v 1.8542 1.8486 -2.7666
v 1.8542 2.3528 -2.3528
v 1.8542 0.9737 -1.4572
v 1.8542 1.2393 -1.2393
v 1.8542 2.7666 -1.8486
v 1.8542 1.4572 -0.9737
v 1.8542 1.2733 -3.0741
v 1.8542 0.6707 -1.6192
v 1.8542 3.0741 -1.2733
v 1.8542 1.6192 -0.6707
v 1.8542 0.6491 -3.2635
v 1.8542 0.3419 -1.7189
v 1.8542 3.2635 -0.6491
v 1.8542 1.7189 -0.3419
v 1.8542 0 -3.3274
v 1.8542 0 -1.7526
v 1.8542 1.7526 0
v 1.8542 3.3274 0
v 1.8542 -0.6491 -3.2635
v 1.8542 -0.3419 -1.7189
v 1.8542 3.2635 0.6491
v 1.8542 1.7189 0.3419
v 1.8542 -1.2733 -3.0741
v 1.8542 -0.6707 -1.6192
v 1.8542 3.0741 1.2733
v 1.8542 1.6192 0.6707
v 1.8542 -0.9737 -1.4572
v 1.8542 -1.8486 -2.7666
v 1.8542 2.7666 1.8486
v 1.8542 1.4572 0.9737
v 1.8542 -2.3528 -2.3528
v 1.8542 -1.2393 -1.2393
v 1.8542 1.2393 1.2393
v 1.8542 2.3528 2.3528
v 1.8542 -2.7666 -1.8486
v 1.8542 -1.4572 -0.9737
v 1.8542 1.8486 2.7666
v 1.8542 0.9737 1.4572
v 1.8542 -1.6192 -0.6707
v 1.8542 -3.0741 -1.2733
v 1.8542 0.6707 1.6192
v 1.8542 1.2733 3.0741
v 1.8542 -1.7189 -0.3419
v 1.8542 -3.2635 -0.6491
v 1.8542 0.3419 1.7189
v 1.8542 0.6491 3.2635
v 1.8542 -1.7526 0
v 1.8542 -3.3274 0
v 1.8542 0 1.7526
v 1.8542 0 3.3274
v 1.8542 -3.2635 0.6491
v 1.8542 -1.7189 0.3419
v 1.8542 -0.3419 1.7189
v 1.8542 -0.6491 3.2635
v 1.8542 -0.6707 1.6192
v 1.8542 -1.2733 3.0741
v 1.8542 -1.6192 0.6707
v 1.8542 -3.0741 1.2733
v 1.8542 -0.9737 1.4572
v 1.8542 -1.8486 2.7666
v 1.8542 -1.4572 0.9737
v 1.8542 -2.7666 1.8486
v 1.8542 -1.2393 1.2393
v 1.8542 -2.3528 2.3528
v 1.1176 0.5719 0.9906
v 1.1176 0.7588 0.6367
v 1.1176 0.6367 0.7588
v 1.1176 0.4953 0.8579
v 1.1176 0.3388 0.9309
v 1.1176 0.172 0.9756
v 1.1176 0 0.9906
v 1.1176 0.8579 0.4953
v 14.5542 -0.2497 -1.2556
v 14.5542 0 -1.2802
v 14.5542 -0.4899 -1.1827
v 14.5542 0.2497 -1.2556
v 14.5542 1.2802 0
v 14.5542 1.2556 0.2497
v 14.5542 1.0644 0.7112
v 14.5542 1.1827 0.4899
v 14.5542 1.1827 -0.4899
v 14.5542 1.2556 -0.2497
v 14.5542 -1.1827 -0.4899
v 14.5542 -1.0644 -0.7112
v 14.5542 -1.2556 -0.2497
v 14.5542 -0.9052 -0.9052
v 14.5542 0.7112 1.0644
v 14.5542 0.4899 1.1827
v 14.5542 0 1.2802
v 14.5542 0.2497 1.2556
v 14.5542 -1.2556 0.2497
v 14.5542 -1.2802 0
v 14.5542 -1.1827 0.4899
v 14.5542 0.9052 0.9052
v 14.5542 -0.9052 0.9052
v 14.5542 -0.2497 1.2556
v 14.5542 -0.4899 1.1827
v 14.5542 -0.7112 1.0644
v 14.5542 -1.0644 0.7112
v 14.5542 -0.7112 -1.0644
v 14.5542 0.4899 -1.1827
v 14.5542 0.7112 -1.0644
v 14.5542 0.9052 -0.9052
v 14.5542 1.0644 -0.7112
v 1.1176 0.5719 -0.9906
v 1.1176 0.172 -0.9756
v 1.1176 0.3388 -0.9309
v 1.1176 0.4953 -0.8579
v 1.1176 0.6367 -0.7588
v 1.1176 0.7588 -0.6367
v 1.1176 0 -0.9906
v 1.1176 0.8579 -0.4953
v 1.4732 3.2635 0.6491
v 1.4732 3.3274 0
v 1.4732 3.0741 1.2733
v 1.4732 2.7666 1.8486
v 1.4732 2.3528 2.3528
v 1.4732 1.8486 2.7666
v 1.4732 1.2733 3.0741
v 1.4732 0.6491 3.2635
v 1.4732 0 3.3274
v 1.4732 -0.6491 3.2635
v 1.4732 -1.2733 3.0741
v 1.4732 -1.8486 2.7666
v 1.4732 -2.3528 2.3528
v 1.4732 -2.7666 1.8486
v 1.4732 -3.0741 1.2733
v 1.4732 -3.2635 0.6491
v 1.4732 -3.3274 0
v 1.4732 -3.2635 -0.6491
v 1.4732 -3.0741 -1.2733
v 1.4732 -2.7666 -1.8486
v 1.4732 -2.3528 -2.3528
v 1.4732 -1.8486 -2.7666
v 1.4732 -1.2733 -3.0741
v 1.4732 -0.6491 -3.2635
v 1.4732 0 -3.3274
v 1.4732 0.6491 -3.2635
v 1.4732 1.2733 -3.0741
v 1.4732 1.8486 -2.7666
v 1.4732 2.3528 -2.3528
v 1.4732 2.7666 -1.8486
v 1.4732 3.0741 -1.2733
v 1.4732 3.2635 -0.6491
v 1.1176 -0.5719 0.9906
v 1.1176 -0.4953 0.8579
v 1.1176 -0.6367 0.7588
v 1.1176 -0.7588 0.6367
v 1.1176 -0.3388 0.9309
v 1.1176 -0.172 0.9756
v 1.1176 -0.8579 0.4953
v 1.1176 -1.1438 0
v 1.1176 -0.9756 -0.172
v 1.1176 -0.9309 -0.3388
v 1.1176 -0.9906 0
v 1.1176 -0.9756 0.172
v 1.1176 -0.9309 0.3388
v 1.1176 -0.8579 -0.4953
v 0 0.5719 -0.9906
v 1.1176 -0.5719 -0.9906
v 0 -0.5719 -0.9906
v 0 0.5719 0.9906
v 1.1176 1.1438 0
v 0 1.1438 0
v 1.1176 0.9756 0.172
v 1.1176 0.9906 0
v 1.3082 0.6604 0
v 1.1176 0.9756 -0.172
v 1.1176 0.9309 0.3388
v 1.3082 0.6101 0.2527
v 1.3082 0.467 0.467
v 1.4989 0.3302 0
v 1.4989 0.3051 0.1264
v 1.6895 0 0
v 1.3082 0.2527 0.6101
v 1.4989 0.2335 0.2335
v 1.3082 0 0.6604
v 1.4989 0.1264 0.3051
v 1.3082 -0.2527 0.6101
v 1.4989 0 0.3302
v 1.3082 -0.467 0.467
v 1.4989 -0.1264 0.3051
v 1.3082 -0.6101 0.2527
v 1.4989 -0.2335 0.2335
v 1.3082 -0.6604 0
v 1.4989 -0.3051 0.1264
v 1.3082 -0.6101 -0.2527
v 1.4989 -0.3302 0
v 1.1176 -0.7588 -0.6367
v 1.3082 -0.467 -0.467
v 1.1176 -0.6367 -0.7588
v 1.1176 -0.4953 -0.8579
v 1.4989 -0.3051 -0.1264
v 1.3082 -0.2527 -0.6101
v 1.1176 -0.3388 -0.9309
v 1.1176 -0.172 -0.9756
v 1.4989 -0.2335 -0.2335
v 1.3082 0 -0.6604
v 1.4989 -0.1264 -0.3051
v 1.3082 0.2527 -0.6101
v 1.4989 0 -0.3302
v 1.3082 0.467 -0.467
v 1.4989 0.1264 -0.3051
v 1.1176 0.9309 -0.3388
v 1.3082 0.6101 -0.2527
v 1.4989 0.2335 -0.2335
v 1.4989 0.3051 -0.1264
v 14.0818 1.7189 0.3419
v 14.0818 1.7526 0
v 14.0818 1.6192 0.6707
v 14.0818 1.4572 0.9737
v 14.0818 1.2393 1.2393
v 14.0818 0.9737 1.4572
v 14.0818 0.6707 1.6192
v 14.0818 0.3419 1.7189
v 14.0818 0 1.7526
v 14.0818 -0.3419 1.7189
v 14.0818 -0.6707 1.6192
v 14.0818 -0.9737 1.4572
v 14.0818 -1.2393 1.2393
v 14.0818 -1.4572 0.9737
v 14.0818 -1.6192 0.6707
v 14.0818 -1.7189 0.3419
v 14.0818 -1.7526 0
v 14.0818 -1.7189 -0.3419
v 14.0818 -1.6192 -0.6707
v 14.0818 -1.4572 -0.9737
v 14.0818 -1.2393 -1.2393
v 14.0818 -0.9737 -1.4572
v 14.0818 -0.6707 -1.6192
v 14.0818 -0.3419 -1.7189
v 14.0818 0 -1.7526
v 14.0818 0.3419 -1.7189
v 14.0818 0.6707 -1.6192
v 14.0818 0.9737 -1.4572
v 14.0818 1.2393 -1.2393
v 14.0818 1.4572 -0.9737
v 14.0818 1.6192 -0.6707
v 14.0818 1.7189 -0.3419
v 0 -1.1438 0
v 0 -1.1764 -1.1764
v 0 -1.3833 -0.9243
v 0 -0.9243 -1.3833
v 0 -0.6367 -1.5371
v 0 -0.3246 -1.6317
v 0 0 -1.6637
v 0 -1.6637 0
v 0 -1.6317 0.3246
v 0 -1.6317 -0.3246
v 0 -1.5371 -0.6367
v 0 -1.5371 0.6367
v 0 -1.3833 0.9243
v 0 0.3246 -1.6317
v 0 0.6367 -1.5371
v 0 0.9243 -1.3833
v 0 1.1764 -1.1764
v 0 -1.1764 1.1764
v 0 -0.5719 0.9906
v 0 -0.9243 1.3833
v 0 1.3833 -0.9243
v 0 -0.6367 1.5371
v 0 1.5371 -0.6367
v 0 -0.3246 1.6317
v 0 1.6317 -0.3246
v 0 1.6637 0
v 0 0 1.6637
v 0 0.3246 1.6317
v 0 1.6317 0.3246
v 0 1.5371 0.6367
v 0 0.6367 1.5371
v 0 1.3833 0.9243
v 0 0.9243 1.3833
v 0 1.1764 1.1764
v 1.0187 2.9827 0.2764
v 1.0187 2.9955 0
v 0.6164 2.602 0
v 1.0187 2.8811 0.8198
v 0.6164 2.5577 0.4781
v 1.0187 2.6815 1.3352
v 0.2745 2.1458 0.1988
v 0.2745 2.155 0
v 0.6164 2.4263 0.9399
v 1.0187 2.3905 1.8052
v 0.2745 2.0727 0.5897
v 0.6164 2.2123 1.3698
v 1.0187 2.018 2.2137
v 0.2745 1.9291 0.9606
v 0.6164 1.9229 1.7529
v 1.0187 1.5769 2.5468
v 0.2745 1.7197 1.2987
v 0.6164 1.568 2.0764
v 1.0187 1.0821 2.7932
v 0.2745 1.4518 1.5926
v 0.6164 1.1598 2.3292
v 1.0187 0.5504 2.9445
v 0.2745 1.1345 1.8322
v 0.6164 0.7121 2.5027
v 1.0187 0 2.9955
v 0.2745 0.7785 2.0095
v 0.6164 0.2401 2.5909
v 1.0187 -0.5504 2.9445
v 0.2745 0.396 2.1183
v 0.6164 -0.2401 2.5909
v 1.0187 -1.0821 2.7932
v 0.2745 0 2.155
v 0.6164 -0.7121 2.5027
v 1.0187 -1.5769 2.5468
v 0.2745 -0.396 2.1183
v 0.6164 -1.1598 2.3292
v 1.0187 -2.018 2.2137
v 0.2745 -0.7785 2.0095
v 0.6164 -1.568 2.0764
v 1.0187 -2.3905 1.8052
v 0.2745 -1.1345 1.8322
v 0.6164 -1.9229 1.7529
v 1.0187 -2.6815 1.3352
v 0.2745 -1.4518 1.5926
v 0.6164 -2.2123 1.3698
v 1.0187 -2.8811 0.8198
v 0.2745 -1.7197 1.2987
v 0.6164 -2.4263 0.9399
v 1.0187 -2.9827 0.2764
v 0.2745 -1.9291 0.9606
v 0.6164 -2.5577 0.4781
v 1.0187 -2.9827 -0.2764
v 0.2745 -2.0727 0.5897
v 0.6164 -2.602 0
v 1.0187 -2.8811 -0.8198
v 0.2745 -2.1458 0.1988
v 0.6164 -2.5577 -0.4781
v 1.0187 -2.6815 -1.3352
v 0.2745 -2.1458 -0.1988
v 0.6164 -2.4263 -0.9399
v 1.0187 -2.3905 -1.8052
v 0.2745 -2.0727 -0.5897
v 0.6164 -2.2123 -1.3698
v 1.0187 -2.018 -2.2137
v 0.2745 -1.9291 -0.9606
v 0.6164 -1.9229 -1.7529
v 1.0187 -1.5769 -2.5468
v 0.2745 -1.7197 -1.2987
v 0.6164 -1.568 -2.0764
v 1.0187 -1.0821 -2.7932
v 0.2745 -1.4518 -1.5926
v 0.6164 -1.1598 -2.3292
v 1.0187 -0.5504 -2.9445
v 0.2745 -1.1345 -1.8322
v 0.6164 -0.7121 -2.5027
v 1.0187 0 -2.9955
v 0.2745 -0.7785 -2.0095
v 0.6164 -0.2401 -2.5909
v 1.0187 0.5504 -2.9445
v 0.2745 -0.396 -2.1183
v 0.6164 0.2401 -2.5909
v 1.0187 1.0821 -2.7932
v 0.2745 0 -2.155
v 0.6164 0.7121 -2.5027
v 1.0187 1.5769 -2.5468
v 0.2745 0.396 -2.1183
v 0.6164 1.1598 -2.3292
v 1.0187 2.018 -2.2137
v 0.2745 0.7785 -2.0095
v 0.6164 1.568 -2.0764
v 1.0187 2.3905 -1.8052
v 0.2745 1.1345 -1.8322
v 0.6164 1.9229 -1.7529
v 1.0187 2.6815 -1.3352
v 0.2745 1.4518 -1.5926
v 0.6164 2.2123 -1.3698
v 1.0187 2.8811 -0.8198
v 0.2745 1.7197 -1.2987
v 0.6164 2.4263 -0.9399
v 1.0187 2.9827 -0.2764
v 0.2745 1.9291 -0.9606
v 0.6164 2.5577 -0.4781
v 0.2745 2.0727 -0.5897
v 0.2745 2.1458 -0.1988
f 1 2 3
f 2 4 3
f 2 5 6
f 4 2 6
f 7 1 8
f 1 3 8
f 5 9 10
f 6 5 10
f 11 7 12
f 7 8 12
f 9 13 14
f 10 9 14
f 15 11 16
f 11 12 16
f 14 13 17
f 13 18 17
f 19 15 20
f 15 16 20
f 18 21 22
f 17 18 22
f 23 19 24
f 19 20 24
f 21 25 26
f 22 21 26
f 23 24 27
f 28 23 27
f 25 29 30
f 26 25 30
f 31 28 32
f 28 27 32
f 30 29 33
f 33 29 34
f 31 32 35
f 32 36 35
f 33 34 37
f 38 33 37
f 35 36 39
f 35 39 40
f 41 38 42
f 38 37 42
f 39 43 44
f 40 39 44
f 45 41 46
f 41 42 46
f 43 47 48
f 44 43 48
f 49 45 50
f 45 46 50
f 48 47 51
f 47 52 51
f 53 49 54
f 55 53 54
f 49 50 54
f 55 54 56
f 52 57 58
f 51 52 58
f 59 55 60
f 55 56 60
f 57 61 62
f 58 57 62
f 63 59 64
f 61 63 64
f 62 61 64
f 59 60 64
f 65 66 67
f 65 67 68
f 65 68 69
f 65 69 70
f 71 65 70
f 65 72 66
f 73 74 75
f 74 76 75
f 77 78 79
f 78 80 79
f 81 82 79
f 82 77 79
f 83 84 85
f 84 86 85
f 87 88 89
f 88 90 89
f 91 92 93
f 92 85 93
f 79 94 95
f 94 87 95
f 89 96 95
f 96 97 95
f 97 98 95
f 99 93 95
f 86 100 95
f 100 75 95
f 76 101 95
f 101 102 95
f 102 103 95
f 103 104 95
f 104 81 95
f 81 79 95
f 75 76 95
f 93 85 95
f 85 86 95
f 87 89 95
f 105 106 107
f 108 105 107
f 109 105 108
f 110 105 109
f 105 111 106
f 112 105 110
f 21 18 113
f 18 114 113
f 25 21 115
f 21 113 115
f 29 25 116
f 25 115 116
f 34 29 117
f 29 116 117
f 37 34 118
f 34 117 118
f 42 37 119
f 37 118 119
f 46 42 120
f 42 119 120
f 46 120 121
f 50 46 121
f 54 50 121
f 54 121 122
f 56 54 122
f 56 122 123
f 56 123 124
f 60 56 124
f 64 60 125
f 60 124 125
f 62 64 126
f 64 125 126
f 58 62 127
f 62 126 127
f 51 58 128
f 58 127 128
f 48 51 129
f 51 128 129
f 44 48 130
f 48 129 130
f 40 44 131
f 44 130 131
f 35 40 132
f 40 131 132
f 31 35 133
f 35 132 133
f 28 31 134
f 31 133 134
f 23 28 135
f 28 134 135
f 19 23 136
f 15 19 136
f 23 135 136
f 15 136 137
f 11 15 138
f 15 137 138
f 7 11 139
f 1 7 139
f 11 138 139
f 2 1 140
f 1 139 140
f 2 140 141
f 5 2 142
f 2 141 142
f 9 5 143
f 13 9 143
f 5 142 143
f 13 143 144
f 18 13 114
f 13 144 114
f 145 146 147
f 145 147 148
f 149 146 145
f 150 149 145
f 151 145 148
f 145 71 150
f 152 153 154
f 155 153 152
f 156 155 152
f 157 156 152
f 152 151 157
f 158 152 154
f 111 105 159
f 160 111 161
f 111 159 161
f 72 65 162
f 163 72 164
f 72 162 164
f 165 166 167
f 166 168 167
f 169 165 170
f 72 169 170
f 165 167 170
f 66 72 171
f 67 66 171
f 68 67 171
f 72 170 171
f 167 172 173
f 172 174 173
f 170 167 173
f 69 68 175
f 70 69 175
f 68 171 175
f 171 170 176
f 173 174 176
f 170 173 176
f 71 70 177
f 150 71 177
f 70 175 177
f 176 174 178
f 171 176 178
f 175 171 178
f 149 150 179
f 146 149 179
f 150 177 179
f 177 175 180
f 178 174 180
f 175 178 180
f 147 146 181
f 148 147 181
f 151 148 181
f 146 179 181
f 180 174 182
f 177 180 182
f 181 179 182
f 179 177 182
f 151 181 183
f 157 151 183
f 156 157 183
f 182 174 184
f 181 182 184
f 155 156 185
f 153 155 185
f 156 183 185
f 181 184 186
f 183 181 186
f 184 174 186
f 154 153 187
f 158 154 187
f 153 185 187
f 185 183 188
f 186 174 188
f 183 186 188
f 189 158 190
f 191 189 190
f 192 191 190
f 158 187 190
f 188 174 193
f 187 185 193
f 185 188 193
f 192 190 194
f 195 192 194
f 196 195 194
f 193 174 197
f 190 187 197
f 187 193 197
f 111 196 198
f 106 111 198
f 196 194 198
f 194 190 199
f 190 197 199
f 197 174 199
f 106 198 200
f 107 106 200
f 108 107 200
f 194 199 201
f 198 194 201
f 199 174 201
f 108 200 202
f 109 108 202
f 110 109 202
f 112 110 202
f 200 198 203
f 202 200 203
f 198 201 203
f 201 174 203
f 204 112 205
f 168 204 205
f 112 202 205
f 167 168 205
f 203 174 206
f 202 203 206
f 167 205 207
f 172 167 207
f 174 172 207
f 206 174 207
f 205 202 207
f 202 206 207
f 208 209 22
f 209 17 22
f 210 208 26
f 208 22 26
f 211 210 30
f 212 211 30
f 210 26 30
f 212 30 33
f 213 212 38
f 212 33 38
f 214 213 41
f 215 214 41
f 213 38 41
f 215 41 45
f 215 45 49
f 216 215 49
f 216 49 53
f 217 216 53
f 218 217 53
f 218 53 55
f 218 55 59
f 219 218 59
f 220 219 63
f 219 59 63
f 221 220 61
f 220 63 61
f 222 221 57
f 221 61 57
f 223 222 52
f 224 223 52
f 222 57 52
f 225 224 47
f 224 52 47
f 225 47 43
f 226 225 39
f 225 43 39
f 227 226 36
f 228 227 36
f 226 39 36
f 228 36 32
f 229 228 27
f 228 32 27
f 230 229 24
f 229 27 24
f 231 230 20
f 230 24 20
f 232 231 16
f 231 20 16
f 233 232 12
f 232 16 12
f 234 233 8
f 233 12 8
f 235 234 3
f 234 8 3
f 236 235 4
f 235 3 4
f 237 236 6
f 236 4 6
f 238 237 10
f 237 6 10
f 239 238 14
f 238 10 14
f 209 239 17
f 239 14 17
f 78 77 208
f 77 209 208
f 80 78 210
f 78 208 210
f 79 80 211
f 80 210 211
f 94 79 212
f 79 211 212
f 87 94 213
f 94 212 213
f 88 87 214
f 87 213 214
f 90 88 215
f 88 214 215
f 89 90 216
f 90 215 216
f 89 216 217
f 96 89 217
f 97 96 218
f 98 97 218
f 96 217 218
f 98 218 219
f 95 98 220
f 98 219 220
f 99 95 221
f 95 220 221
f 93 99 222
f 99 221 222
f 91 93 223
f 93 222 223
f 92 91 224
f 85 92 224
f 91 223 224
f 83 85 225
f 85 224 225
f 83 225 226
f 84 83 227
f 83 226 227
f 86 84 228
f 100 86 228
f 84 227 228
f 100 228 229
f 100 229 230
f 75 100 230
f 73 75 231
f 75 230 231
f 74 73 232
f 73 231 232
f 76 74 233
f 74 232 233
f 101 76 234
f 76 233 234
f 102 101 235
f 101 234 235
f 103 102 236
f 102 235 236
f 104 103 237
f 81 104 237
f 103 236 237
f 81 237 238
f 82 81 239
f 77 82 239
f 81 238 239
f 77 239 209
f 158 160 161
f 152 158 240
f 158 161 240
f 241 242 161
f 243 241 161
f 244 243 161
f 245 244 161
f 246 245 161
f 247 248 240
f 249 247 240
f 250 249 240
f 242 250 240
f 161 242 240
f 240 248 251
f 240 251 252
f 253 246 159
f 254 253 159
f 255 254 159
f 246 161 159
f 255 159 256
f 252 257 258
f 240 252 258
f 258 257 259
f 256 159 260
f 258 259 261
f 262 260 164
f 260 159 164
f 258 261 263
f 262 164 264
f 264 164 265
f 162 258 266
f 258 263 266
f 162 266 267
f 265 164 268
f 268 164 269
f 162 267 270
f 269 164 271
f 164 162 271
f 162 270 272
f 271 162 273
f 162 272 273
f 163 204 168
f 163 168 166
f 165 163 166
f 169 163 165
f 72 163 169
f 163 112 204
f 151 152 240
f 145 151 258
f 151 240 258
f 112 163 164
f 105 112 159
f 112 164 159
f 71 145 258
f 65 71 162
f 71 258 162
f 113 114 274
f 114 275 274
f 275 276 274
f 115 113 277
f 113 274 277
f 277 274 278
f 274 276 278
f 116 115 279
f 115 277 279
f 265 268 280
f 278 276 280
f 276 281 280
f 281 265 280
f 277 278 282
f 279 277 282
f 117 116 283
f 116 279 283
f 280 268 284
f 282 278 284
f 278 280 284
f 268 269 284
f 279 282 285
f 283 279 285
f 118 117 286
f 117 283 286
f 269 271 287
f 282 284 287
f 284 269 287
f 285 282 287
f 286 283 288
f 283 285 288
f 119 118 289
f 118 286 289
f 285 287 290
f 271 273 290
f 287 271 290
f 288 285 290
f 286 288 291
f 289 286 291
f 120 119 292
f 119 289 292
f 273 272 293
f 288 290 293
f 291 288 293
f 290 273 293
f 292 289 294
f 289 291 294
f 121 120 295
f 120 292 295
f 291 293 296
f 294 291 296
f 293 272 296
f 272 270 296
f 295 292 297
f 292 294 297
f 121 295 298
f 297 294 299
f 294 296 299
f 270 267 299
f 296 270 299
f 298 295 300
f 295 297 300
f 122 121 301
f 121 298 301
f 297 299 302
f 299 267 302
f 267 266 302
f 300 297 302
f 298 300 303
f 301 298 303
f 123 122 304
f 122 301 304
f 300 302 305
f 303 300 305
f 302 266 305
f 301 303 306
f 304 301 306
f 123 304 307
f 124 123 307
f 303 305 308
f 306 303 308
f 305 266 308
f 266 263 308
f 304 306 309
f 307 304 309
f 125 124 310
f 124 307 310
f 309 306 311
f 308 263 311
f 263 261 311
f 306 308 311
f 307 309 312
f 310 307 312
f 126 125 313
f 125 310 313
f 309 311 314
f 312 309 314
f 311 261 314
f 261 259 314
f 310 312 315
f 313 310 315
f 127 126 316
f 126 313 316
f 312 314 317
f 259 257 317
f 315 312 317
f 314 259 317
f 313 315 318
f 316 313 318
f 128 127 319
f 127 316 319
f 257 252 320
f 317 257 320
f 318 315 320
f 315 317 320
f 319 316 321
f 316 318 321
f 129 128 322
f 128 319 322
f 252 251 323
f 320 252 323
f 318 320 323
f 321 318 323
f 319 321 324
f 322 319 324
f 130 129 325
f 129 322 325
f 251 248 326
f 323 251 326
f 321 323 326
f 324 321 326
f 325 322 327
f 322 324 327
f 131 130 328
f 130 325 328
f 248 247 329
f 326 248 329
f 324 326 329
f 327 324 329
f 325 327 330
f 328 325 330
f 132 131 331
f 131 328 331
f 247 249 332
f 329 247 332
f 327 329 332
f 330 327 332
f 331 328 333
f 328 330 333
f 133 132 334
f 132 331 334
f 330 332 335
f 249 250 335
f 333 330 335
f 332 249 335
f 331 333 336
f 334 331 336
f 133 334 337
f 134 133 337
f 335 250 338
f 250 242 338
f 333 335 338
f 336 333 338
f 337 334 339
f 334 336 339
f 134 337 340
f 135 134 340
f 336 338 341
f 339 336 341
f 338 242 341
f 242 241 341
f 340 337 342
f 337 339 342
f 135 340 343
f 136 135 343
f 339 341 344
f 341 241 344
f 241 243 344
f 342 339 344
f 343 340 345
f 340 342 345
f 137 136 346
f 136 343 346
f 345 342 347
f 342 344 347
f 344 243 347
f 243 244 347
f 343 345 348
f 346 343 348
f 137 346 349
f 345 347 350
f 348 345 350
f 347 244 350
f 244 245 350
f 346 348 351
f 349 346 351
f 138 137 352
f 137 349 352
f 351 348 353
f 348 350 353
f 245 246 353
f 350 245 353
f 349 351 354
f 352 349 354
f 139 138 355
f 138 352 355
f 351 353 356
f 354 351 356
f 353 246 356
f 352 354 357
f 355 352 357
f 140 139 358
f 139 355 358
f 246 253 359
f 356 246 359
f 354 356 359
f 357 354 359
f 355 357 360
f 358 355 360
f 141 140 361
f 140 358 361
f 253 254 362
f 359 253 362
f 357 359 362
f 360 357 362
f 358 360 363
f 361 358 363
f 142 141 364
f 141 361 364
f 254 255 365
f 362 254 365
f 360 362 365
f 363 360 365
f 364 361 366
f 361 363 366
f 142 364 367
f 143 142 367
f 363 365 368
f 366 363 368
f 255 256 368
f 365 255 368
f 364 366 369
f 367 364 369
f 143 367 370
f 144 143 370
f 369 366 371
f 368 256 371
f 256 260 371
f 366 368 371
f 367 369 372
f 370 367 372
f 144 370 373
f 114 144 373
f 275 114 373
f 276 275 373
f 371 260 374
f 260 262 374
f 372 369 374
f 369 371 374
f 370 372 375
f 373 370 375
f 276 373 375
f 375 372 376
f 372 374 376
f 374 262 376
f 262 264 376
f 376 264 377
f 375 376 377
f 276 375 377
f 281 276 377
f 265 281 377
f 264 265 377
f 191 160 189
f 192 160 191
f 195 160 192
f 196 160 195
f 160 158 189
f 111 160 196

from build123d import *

# Parameters (mm, degrees)
HEX_2_DEPTH = 1.1176


with BuildPart() as part:
    # BodySke → BaseBody (revolve)
    with BuildSketch(Plane.XY):
        with BuildLine():
            Line((14.5542, 0), (14.5542, 1.28016))
            Line((14.5542, 1.28016), (14.08176, 1.7526))
            Line((14.08176, 1.7526), (1.8542, 1.7526))
            Line((1.8542, 1.7526), (1.8542, 3.3274))
            Line((1.8542, 3.3274), (1.4732, 3.3274))
            ThreePointArc((1.4732, 3.3274), (0.616396771, 2.601989501), (0, 1.6637))
            Line((0, 1.6637), (0, 0))
            Line((0, 0), (14.5542, 0))
        make_face()
    revolve(axis=Axis((0, 0, 0), (1, 0, 0)))

    # Sketch2 → PreBroach (revolve, cut)
    with BuildSketch(Plane.XY):
        Polygon((0, 0.9906), (1.1176, 0.9906), (1.689523177, 0), (0, 0), align=None)
    revolve(axis=Axis((0, 0, 0), (1, 0, 0)), mode=Mode.SUBTRACT)

    # Sketch3 → Hex 2 (cut)
    with BuildSketch(Plane(origin=(0, 0, 0), x_dir=(0, 0, -1), z_dir=(1, 0, 0))):
        Polygon((-0.9906, -0.571923177), (-0.9906, 0.571923177), (0, 1.143846353), (0.9906, 0.571923177), (0.9906, -0.571923177), (0, -1.143846353), align=None)
    extrude(amount=HEX_2_DEPTH, mode=Mode.SUBTRACT)


solid = part.part
